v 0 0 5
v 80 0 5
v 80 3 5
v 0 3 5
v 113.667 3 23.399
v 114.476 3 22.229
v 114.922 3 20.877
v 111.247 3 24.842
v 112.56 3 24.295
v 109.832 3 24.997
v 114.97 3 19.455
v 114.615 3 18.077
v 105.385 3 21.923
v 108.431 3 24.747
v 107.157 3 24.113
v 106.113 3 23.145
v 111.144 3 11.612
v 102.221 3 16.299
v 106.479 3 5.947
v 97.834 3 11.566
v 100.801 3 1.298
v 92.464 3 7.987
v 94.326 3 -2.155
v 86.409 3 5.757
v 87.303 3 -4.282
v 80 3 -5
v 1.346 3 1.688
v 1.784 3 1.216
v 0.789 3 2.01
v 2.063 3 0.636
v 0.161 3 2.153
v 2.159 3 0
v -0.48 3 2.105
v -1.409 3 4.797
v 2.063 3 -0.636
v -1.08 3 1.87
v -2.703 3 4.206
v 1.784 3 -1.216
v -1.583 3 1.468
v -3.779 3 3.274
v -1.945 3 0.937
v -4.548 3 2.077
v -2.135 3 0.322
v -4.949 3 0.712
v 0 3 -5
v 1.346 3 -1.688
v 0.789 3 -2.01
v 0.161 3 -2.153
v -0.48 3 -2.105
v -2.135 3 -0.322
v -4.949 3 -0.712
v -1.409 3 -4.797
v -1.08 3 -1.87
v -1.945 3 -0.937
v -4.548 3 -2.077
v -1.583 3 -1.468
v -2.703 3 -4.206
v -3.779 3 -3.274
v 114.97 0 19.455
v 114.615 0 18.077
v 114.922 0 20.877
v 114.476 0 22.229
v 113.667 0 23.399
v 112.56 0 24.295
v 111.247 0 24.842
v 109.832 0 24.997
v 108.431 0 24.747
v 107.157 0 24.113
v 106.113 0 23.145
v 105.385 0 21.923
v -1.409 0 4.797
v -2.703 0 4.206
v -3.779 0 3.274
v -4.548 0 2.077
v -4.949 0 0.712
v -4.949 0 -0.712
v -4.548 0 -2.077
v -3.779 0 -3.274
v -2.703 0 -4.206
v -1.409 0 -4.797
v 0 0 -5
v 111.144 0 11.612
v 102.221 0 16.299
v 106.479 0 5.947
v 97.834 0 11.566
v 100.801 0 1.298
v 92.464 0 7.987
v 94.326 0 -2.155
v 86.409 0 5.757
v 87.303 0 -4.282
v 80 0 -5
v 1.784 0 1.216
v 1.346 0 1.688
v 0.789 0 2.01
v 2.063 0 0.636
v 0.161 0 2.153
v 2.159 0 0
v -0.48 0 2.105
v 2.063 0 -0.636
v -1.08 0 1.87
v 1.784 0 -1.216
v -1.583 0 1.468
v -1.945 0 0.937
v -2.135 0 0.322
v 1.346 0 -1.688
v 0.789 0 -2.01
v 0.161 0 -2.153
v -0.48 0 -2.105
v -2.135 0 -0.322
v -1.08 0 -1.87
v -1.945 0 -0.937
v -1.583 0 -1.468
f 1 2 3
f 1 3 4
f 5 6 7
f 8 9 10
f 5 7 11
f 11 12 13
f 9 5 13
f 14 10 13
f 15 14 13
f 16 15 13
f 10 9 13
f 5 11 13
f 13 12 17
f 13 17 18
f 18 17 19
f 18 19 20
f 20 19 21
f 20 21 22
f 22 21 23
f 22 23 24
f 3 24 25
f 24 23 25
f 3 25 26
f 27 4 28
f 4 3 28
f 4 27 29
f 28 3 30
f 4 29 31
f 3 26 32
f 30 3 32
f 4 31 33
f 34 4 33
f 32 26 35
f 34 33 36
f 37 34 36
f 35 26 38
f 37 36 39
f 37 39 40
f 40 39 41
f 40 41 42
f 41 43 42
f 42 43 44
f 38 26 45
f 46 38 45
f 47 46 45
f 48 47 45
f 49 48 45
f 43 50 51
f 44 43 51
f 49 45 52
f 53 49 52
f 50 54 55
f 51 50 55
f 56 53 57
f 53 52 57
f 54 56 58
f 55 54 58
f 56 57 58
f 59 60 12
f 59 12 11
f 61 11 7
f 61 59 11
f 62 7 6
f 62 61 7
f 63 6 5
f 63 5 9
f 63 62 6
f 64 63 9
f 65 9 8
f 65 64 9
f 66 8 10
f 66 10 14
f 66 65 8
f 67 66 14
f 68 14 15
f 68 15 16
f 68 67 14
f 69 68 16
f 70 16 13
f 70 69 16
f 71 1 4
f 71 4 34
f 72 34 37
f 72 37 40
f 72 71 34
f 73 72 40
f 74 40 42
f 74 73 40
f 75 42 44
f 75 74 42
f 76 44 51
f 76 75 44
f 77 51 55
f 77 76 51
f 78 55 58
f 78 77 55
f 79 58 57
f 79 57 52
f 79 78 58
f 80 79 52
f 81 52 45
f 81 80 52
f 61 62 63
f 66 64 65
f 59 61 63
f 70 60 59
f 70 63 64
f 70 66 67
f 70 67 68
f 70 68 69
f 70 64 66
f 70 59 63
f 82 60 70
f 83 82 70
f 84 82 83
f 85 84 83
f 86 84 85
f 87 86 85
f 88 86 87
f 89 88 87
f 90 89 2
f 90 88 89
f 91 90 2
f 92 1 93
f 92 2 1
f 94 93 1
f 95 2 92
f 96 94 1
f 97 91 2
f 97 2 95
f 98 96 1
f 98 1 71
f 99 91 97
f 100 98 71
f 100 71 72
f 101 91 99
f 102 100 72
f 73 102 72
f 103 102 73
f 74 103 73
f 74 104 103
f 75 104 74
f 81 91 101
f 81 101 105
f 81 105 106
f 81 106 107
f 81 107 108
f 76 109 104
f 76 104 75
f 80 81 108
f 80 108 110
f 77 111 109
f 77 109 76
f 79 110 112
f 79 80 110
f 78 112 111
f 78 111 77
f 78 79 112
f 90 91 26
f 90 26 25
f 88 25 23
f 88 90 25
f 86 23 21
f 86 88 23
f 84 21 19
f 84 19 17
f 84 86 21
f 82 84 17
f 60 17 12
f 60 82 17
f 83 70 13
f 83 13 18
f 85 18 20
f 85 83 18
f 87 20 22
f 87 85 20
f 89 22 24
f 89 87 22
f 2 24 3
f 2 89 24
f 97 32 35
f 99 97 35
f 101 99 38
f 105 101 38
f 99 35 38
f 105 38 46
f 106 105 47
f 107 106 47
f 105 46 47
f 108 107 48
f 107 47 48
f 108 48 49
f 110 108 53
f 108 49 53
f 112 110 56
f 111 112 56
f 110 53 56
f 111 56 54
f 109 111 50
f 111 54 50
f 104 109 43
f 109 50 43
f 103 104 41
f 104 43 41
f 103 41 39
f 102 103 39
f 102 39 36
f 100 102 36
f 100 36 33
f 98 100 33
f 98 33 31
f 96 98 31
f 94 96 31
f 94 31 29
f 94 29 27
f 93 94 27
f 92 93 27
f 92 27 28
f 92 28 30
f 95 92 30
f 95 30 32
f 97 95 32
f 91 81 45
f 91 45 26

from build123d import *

# Parameters (mm, degrees)
BOSS_EXTRUDE1_DEPTH = 3
CUT_EXTRUDE1_REACH  = 5
SKETCH2_R           = 2.159


with BuildPart() as part:
    # Sketch1 → Boss-Extrude1 (new body)
    with BuildSketch(Plane(origin=(0, 0, 0), x_dir=(1, 0, 0), z_dir=(0, 1, 0))):
        with BuildLine():
            Line((0, 5), (80, 5))
            ThreePointArc((80, 5), (100.801257358, -1.298113962), (114.615384615, -18.076923077))
            ThreePointArc((114.615384615, -18.076923077), (111.923076923, -24.615384615), (105.384615385, -21.923076923))
            ThreePointArc((105.384615385, -21.923076923), (95.254255396, -9.618616906), (80, -5))
            Line((80, -5), (0, -5))
            ThreePointArc((0, -5), (-5, 0), (0, 5))
        make_face()
    extrude(amount=BOSS_EXTRUDE1_DEPTH)

    # Sketch2 → Cut-Extrude1 (cut, up to next)
    with BuildSketch(Plane(origin=(0, 3, 0), x_dir=(1, 0, 0), z_dir=(0, 1, 0)), mode=Mode.PRIVATE) as cut_extrude1_sk1:
        Circle(SKETCH2_R)
    cut_extrude1_tool1 = extrude(cut_extrude1_sk1.sketch, amount=-CUT_EXTRUDE1_REACH, mode=Mode.PRIVATE) & part.part
    add(cut_extrude1_tool1.solids().sort_by_distance((0, 3, 0))[0], mode=Mode.SUBTRACT)


solid = part.part
